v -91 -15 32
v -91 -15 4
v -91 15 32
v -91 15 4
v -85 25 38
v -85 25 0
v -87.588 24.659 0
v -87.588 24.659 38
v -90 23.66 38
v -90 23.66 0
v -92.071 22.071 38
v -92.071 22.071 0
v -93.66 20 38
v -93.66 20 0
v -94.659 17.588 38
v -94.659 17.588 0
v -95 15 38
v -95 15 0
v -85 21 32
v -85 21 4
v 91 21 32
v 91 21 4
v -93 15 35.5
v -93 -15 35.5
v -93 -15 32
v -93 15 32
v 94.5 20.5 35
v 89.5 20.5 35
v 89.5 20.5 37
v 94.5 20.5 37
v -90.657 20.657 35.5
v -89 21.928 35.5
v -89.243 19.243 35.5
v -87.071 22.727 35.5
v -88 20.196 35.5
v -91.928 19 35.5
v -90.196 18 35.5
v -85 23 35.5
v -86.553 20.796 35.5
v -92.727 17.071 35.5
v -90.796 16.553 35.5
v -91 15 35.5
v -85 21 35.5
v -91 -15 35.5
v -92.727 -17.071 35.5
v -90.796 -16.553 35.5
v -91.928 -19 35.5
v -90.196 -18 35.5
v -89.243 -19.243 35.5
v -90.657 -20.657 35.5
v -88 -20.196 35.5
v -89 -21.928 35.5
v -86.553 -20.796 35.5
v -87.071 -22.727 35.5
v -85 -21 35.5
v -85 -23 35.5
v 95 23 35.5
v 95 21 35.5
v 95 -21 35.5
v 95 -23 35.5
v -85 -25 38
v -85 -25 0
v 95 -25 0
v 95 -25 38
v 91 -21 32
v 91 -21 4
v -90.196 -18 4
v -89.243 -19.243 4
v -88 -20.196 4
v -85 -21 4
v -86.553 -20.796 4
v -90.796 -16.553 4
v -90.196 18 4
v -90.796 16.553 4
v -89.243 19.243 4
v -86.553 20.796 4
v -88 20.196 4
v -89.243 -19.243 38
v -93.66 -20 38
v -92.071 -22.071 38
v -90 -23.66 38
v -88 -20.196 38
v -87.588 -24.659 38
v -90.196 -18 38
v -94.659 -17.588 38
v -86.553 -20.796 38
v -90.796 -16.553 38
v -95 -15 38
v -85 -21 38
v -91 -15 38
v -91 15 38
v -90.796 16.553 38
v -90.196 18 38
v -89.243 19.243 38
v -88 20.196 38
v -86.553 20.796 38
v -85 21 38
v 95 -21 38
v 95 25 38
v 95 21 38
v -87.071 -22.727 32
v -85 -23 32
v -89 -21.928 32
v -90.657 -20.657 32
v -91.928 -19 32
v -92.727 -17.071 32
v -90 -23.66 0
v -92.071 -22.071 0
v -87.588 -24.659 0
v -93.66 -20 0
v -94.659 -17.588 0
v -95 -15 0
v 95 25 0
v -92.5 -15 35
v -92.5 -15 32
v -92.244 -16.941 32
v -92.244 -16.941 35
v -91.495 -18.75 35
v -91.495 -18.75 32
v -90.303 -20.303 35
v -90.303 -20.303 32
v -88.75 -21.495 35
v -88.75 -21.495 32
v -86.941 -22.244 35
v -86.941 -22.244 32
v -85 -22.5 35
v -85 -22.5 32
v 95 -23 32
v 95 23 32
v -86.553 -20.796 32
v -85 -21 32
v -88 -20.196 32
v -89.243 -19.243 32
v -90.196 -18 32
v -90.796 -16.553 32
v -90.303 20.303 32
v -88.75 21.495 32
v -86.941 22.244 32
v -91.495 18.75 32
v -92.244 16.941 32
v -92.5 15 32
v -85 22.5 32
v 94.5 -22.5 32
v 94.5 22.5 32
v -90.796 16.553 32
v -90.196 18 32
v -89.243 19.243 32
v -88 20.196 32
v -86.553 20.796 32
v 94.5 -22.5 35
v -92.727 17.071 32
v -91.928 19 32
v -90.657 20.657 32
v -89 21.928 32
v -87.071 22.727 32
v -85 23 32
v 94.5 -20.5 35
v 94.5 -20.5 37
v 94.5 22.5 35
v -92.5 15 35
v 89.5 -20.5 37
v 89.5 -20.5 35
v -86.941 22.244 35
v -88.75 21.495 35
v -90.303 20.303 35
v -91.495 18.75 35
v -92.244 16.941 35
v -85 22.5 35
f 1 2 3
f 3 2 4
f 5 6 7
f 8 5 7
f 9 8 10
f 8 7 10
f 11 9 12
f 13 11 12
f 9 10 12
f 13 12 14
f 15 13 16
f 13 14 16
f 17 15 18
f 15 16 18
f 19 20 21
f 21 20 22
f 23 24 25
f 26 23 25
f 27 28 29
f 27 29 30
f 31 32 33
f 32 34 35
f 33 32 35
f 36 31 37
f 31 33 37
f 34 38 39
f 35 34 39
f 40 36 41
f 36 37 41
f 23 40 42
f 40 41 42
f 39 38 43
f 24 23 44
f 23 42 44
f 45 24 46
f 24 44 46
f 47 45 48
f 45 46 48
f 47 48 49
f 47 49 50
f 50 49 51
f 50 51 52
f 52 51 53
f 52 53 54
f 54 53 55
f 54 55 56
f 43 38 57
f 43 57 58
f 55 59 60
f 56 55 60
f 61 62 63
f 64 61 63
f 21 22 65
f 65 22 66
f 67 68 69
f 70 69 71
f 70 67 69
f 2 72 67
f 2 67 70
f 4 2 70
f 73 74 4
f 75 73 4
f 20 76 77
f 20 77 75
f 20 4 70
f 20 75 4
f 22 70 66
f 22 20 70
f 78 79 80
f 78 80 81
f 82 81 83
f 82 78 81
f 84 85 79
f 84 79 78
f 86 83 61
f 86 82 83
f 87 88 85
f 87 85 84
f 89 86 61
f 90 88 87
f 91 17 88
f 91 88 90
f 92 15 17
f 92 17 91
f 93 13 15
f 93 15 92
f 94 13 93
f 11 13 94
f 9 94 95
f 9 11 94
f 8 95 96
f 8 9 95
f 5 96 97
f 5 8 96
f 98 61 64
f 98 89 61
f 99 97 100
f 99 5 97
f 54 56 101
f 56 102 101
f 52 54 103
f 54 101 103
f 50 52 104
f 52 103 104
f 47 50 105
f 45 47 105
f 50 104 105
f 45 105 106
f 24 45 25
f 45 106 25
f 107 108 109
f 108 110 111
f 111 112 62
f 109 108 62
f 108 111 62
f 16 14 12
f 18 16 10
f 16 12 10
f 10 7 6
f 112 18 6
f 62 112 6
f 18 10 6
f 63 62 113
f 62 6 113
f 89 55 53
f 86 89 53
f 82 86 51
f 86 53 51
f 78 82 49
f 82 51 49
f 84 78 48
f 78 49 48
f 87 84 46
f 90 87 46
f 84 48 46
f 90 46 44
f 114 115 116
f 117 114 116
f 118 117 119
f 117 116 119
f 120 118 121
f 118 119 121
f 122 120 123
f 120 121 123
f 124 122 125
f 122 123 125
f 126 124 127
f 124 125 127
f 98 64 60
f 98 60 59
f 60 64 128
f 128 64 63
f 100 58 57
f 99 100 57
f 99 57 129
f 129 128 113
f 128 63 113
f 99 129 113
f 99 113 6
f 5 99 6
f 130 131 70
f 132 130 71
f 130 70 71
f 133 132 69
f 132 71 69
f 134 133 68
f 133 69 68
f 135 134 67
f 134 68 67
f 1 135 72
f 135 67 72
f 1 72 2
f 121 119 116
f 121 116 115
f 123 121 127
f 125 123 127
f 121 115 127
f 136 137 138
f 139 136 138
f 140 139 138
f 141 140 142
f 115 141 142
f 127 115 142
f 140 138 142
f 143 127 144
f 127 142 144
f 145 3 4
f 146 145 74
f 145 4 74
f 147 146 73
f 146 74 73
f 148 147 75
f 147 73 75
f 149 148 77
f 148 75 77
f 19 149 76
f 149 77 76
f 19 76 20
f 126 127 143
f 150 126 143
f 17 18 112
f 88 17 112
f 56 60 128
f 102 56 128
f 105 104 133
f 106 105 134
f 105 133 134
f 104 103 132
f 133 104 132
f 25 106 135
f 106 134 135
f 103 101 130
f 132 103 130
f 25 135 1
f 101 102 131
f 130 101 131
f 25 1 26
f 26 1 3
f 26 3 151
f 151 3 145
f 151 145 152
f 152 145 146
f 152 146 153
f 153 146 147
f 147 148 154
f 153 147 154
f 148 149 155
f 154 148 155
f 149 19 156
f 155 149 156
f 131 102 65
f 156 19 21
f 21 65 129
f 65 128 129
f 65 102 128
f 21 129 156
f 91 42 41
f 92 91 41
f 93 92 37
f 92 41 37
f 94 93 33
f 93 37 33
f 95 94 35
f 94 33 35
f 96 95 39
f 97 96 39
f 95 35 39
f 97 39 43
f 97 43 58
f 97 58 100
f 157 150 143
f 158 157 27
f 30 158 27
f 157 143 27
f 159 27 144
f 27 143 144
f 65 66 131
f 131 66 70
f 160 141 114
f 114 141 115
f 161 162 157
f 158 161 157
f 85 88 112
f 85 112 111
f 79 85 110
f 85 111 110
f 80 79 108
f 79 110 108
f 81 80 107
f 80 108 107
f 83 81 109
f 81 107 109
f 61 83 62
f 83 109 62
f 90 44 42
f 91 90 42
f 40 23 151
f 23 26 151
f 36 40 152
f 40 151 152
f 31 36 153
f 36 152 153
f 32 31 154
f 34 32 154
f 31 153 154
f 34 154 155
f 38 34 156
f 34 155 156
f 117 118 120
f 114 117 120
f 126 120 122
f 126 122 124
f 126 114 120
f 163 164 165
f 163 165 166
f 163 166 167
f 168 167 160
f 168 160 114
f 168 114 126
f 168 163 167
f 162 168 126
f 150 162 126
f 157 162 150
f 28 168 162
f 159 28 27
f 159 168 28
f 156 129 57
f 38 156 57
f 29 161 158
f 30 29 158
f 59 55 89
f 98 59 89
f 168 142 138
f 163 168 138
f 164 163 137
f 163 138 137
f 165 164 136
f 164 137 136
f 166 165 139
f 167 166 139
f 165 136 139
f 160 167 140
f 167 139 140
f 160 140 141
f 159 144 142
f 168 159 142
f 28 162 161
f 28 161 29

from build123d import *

# Parameters (mm, degrees)
F1_DEPTH  = 38
F2_DEPTH  = 4
F3_W      = 42
F3_H      = 2.5
F4_DEPTH  = 180
F5_W      = 2
F5_H      = 3.5
F8_DEPTH  = 3
F9_W      = 5
F9_H      = 41
F10_DEPTH = 2


# Not quite as in the source:
# - a feature names something its author has since deleted; it is built from what else it names


with BuildPart() as f1:
    # F0 (on Top) → F1 (new body)
    with BuildSketch(Plane.XY):
        with BuildLine():
            ThreePointArc((-91, 15), (-89.2426406871, 19.2426406871), (-85, 21))
            Line((-85, 21), (-85, 25))
            ThreePointArc((-85, 25), (-92.0710678119, 22.0710678119), (-95, 15))
            Line((-95, 15), (-91, 15))
        make_face()
        with BuildLine():
            Line((91, 21), (91, -21))
            Line((91, -21), (-85, -21))
            ThreePointArc((-85, -21), (-89.2426406871, -19.2426406871), (-91, -15))
            Line((-91, -15), (-91, 15))
            Line((-91, 15), (-95, 15))
            Line((-95, 15), (-95, -15))
            ThreePointArc((-95, -15), (-92.0710678119, -22.0710678119), (-85, -25))
            Line((-85, -25), (95, -25))
            Line((95, -25), (95, 25))
            Line((95, 25), (-85, 25))
            Line((-85, 25), (-85, 21))
            Line((-85, 21), (91, 21))
        make_face()
    extrude(amount=F1_DEPTH)

    # F0 (on Top) → F2 (join)
    with BuildSketch(Plane.XY):
        with BuildLine():
            Line((-85, -21), (91, -21))
            Line((91, -21), (91, 21))
            Line((91, 21), (-85, 21))
            ThreePointArc((-85, 21), (-89.2426406871, 19.2426406871), (-91, 15))
            Line((-91, 15), (-91, -15))
            ThreePointArc((-91, -15), (-89.2426406871, -19.2426406871), (-85, -21))
        make_face()
    extrude(amount=F2_DEPTH)

    # F3 (on face) → F4 (cut, through all)
    with BuildSketch(Plane.YZ.offset(95)):
        with Locations((0, 36.75)):
            Rectangle(F3_W, F3_H)
        Polygon((21, 35.5), (-21, 35.5), (-23, 35.5), (-23, 32), (-21, 32), (21, 32), (23, 32), (23, 35.5), align=None)
    extrude(amount=-F4_DEPTH, mode=Mode.SUBTRACT)

    # F6: sweep along a path in F6_path
    with BuildLine(Plane(origin=(-91, -15, 38), x_dir=(0, -1, 0), z_dir=(0, 0, -1))) as f6_path:
        ThreePointArc((6, -6), (4.2426406871, -1.7573593129), (0, 0))
        Line((0, 0), (-30, 0))
        ThreePointArc((-30, 0), (-34.2426406871, -1.7573593129), (-36, -6))
    # F5 (on face) → F6 (sweep, cut)
    with BuildSketch(Plane.YZ.offset(-85)):
        with Locations((-22, 33.75)):
            Rectangle(F5_W, F5_H)
    sweep(path=f6_path.line, mode=Mode.SUBTRACT)


with BuildPart() as f8:
    # F7 (on face) → F8 (new body)
    with BuildSketch(Plane.XY.offset(32)):
        with BuildLine():
            Line((94.4999977946, 22.4999977946), (-85, 22.4999977946))
            ThreePointArc((-85, 22.4999977946), (-90.3032992995, 20.3032992995), (-92.4999977946, 15))
            Line((-92.4999977946, 15), (-92.4999977946, -15))
            ThreePointArc((-92.4999977946, -15), (-90.3032992995, -20.3032992995), (-85, -22.4999977946))
            Line((-85, -22.4999977946), (94.4999977946, -22.4999977946))
            Line((94.4999977946, -22.4999977946), (94.4999977946, 22.4999977946))
        make_face()
        with BuildLine():
            ThreePointArc((-91, 15), (-89.2426406871, 19.2426406871), (-85, 21))
            Line((-85, 21), (91, 21))
            Line((91, 21), (91, -21))
            Line((91, -21), (-85, -21))
            ThreePointArc((-85, -21), (-89.2426406871, -19.2426406871), (-91, -15))
            Line((-91, -15), (-91, 15))
        make_face(mode=Mode.SUBTRACT)
        with BuildLine():
            Line((91, 21), (-85, 21))
            ThreePointArc((-85, 21), (-89.2426406871, 19.2426406871), (-91, 15))
            Line((-91, 15), (-91, -15))
            ThreePointArc((-91, -15), (-89.2426406871, -19.2426406871), (-85, -21))
            Line((-85, -21), (91, -21))
            Line((91, -21), (91, 21))
        make_face()
    extrude(amount=F8_DEPTH)

    # F9 (on face) → F10 (join, through all)
    with BuildSketch(Plane.XY.offset(35)):
        with Locations((91.9999977946, 0)):
            Rectangle(F9_W, F9_H)
    extrude(amount=F10_DEPTH)


solid = Compound([f1.part, f8.part])
